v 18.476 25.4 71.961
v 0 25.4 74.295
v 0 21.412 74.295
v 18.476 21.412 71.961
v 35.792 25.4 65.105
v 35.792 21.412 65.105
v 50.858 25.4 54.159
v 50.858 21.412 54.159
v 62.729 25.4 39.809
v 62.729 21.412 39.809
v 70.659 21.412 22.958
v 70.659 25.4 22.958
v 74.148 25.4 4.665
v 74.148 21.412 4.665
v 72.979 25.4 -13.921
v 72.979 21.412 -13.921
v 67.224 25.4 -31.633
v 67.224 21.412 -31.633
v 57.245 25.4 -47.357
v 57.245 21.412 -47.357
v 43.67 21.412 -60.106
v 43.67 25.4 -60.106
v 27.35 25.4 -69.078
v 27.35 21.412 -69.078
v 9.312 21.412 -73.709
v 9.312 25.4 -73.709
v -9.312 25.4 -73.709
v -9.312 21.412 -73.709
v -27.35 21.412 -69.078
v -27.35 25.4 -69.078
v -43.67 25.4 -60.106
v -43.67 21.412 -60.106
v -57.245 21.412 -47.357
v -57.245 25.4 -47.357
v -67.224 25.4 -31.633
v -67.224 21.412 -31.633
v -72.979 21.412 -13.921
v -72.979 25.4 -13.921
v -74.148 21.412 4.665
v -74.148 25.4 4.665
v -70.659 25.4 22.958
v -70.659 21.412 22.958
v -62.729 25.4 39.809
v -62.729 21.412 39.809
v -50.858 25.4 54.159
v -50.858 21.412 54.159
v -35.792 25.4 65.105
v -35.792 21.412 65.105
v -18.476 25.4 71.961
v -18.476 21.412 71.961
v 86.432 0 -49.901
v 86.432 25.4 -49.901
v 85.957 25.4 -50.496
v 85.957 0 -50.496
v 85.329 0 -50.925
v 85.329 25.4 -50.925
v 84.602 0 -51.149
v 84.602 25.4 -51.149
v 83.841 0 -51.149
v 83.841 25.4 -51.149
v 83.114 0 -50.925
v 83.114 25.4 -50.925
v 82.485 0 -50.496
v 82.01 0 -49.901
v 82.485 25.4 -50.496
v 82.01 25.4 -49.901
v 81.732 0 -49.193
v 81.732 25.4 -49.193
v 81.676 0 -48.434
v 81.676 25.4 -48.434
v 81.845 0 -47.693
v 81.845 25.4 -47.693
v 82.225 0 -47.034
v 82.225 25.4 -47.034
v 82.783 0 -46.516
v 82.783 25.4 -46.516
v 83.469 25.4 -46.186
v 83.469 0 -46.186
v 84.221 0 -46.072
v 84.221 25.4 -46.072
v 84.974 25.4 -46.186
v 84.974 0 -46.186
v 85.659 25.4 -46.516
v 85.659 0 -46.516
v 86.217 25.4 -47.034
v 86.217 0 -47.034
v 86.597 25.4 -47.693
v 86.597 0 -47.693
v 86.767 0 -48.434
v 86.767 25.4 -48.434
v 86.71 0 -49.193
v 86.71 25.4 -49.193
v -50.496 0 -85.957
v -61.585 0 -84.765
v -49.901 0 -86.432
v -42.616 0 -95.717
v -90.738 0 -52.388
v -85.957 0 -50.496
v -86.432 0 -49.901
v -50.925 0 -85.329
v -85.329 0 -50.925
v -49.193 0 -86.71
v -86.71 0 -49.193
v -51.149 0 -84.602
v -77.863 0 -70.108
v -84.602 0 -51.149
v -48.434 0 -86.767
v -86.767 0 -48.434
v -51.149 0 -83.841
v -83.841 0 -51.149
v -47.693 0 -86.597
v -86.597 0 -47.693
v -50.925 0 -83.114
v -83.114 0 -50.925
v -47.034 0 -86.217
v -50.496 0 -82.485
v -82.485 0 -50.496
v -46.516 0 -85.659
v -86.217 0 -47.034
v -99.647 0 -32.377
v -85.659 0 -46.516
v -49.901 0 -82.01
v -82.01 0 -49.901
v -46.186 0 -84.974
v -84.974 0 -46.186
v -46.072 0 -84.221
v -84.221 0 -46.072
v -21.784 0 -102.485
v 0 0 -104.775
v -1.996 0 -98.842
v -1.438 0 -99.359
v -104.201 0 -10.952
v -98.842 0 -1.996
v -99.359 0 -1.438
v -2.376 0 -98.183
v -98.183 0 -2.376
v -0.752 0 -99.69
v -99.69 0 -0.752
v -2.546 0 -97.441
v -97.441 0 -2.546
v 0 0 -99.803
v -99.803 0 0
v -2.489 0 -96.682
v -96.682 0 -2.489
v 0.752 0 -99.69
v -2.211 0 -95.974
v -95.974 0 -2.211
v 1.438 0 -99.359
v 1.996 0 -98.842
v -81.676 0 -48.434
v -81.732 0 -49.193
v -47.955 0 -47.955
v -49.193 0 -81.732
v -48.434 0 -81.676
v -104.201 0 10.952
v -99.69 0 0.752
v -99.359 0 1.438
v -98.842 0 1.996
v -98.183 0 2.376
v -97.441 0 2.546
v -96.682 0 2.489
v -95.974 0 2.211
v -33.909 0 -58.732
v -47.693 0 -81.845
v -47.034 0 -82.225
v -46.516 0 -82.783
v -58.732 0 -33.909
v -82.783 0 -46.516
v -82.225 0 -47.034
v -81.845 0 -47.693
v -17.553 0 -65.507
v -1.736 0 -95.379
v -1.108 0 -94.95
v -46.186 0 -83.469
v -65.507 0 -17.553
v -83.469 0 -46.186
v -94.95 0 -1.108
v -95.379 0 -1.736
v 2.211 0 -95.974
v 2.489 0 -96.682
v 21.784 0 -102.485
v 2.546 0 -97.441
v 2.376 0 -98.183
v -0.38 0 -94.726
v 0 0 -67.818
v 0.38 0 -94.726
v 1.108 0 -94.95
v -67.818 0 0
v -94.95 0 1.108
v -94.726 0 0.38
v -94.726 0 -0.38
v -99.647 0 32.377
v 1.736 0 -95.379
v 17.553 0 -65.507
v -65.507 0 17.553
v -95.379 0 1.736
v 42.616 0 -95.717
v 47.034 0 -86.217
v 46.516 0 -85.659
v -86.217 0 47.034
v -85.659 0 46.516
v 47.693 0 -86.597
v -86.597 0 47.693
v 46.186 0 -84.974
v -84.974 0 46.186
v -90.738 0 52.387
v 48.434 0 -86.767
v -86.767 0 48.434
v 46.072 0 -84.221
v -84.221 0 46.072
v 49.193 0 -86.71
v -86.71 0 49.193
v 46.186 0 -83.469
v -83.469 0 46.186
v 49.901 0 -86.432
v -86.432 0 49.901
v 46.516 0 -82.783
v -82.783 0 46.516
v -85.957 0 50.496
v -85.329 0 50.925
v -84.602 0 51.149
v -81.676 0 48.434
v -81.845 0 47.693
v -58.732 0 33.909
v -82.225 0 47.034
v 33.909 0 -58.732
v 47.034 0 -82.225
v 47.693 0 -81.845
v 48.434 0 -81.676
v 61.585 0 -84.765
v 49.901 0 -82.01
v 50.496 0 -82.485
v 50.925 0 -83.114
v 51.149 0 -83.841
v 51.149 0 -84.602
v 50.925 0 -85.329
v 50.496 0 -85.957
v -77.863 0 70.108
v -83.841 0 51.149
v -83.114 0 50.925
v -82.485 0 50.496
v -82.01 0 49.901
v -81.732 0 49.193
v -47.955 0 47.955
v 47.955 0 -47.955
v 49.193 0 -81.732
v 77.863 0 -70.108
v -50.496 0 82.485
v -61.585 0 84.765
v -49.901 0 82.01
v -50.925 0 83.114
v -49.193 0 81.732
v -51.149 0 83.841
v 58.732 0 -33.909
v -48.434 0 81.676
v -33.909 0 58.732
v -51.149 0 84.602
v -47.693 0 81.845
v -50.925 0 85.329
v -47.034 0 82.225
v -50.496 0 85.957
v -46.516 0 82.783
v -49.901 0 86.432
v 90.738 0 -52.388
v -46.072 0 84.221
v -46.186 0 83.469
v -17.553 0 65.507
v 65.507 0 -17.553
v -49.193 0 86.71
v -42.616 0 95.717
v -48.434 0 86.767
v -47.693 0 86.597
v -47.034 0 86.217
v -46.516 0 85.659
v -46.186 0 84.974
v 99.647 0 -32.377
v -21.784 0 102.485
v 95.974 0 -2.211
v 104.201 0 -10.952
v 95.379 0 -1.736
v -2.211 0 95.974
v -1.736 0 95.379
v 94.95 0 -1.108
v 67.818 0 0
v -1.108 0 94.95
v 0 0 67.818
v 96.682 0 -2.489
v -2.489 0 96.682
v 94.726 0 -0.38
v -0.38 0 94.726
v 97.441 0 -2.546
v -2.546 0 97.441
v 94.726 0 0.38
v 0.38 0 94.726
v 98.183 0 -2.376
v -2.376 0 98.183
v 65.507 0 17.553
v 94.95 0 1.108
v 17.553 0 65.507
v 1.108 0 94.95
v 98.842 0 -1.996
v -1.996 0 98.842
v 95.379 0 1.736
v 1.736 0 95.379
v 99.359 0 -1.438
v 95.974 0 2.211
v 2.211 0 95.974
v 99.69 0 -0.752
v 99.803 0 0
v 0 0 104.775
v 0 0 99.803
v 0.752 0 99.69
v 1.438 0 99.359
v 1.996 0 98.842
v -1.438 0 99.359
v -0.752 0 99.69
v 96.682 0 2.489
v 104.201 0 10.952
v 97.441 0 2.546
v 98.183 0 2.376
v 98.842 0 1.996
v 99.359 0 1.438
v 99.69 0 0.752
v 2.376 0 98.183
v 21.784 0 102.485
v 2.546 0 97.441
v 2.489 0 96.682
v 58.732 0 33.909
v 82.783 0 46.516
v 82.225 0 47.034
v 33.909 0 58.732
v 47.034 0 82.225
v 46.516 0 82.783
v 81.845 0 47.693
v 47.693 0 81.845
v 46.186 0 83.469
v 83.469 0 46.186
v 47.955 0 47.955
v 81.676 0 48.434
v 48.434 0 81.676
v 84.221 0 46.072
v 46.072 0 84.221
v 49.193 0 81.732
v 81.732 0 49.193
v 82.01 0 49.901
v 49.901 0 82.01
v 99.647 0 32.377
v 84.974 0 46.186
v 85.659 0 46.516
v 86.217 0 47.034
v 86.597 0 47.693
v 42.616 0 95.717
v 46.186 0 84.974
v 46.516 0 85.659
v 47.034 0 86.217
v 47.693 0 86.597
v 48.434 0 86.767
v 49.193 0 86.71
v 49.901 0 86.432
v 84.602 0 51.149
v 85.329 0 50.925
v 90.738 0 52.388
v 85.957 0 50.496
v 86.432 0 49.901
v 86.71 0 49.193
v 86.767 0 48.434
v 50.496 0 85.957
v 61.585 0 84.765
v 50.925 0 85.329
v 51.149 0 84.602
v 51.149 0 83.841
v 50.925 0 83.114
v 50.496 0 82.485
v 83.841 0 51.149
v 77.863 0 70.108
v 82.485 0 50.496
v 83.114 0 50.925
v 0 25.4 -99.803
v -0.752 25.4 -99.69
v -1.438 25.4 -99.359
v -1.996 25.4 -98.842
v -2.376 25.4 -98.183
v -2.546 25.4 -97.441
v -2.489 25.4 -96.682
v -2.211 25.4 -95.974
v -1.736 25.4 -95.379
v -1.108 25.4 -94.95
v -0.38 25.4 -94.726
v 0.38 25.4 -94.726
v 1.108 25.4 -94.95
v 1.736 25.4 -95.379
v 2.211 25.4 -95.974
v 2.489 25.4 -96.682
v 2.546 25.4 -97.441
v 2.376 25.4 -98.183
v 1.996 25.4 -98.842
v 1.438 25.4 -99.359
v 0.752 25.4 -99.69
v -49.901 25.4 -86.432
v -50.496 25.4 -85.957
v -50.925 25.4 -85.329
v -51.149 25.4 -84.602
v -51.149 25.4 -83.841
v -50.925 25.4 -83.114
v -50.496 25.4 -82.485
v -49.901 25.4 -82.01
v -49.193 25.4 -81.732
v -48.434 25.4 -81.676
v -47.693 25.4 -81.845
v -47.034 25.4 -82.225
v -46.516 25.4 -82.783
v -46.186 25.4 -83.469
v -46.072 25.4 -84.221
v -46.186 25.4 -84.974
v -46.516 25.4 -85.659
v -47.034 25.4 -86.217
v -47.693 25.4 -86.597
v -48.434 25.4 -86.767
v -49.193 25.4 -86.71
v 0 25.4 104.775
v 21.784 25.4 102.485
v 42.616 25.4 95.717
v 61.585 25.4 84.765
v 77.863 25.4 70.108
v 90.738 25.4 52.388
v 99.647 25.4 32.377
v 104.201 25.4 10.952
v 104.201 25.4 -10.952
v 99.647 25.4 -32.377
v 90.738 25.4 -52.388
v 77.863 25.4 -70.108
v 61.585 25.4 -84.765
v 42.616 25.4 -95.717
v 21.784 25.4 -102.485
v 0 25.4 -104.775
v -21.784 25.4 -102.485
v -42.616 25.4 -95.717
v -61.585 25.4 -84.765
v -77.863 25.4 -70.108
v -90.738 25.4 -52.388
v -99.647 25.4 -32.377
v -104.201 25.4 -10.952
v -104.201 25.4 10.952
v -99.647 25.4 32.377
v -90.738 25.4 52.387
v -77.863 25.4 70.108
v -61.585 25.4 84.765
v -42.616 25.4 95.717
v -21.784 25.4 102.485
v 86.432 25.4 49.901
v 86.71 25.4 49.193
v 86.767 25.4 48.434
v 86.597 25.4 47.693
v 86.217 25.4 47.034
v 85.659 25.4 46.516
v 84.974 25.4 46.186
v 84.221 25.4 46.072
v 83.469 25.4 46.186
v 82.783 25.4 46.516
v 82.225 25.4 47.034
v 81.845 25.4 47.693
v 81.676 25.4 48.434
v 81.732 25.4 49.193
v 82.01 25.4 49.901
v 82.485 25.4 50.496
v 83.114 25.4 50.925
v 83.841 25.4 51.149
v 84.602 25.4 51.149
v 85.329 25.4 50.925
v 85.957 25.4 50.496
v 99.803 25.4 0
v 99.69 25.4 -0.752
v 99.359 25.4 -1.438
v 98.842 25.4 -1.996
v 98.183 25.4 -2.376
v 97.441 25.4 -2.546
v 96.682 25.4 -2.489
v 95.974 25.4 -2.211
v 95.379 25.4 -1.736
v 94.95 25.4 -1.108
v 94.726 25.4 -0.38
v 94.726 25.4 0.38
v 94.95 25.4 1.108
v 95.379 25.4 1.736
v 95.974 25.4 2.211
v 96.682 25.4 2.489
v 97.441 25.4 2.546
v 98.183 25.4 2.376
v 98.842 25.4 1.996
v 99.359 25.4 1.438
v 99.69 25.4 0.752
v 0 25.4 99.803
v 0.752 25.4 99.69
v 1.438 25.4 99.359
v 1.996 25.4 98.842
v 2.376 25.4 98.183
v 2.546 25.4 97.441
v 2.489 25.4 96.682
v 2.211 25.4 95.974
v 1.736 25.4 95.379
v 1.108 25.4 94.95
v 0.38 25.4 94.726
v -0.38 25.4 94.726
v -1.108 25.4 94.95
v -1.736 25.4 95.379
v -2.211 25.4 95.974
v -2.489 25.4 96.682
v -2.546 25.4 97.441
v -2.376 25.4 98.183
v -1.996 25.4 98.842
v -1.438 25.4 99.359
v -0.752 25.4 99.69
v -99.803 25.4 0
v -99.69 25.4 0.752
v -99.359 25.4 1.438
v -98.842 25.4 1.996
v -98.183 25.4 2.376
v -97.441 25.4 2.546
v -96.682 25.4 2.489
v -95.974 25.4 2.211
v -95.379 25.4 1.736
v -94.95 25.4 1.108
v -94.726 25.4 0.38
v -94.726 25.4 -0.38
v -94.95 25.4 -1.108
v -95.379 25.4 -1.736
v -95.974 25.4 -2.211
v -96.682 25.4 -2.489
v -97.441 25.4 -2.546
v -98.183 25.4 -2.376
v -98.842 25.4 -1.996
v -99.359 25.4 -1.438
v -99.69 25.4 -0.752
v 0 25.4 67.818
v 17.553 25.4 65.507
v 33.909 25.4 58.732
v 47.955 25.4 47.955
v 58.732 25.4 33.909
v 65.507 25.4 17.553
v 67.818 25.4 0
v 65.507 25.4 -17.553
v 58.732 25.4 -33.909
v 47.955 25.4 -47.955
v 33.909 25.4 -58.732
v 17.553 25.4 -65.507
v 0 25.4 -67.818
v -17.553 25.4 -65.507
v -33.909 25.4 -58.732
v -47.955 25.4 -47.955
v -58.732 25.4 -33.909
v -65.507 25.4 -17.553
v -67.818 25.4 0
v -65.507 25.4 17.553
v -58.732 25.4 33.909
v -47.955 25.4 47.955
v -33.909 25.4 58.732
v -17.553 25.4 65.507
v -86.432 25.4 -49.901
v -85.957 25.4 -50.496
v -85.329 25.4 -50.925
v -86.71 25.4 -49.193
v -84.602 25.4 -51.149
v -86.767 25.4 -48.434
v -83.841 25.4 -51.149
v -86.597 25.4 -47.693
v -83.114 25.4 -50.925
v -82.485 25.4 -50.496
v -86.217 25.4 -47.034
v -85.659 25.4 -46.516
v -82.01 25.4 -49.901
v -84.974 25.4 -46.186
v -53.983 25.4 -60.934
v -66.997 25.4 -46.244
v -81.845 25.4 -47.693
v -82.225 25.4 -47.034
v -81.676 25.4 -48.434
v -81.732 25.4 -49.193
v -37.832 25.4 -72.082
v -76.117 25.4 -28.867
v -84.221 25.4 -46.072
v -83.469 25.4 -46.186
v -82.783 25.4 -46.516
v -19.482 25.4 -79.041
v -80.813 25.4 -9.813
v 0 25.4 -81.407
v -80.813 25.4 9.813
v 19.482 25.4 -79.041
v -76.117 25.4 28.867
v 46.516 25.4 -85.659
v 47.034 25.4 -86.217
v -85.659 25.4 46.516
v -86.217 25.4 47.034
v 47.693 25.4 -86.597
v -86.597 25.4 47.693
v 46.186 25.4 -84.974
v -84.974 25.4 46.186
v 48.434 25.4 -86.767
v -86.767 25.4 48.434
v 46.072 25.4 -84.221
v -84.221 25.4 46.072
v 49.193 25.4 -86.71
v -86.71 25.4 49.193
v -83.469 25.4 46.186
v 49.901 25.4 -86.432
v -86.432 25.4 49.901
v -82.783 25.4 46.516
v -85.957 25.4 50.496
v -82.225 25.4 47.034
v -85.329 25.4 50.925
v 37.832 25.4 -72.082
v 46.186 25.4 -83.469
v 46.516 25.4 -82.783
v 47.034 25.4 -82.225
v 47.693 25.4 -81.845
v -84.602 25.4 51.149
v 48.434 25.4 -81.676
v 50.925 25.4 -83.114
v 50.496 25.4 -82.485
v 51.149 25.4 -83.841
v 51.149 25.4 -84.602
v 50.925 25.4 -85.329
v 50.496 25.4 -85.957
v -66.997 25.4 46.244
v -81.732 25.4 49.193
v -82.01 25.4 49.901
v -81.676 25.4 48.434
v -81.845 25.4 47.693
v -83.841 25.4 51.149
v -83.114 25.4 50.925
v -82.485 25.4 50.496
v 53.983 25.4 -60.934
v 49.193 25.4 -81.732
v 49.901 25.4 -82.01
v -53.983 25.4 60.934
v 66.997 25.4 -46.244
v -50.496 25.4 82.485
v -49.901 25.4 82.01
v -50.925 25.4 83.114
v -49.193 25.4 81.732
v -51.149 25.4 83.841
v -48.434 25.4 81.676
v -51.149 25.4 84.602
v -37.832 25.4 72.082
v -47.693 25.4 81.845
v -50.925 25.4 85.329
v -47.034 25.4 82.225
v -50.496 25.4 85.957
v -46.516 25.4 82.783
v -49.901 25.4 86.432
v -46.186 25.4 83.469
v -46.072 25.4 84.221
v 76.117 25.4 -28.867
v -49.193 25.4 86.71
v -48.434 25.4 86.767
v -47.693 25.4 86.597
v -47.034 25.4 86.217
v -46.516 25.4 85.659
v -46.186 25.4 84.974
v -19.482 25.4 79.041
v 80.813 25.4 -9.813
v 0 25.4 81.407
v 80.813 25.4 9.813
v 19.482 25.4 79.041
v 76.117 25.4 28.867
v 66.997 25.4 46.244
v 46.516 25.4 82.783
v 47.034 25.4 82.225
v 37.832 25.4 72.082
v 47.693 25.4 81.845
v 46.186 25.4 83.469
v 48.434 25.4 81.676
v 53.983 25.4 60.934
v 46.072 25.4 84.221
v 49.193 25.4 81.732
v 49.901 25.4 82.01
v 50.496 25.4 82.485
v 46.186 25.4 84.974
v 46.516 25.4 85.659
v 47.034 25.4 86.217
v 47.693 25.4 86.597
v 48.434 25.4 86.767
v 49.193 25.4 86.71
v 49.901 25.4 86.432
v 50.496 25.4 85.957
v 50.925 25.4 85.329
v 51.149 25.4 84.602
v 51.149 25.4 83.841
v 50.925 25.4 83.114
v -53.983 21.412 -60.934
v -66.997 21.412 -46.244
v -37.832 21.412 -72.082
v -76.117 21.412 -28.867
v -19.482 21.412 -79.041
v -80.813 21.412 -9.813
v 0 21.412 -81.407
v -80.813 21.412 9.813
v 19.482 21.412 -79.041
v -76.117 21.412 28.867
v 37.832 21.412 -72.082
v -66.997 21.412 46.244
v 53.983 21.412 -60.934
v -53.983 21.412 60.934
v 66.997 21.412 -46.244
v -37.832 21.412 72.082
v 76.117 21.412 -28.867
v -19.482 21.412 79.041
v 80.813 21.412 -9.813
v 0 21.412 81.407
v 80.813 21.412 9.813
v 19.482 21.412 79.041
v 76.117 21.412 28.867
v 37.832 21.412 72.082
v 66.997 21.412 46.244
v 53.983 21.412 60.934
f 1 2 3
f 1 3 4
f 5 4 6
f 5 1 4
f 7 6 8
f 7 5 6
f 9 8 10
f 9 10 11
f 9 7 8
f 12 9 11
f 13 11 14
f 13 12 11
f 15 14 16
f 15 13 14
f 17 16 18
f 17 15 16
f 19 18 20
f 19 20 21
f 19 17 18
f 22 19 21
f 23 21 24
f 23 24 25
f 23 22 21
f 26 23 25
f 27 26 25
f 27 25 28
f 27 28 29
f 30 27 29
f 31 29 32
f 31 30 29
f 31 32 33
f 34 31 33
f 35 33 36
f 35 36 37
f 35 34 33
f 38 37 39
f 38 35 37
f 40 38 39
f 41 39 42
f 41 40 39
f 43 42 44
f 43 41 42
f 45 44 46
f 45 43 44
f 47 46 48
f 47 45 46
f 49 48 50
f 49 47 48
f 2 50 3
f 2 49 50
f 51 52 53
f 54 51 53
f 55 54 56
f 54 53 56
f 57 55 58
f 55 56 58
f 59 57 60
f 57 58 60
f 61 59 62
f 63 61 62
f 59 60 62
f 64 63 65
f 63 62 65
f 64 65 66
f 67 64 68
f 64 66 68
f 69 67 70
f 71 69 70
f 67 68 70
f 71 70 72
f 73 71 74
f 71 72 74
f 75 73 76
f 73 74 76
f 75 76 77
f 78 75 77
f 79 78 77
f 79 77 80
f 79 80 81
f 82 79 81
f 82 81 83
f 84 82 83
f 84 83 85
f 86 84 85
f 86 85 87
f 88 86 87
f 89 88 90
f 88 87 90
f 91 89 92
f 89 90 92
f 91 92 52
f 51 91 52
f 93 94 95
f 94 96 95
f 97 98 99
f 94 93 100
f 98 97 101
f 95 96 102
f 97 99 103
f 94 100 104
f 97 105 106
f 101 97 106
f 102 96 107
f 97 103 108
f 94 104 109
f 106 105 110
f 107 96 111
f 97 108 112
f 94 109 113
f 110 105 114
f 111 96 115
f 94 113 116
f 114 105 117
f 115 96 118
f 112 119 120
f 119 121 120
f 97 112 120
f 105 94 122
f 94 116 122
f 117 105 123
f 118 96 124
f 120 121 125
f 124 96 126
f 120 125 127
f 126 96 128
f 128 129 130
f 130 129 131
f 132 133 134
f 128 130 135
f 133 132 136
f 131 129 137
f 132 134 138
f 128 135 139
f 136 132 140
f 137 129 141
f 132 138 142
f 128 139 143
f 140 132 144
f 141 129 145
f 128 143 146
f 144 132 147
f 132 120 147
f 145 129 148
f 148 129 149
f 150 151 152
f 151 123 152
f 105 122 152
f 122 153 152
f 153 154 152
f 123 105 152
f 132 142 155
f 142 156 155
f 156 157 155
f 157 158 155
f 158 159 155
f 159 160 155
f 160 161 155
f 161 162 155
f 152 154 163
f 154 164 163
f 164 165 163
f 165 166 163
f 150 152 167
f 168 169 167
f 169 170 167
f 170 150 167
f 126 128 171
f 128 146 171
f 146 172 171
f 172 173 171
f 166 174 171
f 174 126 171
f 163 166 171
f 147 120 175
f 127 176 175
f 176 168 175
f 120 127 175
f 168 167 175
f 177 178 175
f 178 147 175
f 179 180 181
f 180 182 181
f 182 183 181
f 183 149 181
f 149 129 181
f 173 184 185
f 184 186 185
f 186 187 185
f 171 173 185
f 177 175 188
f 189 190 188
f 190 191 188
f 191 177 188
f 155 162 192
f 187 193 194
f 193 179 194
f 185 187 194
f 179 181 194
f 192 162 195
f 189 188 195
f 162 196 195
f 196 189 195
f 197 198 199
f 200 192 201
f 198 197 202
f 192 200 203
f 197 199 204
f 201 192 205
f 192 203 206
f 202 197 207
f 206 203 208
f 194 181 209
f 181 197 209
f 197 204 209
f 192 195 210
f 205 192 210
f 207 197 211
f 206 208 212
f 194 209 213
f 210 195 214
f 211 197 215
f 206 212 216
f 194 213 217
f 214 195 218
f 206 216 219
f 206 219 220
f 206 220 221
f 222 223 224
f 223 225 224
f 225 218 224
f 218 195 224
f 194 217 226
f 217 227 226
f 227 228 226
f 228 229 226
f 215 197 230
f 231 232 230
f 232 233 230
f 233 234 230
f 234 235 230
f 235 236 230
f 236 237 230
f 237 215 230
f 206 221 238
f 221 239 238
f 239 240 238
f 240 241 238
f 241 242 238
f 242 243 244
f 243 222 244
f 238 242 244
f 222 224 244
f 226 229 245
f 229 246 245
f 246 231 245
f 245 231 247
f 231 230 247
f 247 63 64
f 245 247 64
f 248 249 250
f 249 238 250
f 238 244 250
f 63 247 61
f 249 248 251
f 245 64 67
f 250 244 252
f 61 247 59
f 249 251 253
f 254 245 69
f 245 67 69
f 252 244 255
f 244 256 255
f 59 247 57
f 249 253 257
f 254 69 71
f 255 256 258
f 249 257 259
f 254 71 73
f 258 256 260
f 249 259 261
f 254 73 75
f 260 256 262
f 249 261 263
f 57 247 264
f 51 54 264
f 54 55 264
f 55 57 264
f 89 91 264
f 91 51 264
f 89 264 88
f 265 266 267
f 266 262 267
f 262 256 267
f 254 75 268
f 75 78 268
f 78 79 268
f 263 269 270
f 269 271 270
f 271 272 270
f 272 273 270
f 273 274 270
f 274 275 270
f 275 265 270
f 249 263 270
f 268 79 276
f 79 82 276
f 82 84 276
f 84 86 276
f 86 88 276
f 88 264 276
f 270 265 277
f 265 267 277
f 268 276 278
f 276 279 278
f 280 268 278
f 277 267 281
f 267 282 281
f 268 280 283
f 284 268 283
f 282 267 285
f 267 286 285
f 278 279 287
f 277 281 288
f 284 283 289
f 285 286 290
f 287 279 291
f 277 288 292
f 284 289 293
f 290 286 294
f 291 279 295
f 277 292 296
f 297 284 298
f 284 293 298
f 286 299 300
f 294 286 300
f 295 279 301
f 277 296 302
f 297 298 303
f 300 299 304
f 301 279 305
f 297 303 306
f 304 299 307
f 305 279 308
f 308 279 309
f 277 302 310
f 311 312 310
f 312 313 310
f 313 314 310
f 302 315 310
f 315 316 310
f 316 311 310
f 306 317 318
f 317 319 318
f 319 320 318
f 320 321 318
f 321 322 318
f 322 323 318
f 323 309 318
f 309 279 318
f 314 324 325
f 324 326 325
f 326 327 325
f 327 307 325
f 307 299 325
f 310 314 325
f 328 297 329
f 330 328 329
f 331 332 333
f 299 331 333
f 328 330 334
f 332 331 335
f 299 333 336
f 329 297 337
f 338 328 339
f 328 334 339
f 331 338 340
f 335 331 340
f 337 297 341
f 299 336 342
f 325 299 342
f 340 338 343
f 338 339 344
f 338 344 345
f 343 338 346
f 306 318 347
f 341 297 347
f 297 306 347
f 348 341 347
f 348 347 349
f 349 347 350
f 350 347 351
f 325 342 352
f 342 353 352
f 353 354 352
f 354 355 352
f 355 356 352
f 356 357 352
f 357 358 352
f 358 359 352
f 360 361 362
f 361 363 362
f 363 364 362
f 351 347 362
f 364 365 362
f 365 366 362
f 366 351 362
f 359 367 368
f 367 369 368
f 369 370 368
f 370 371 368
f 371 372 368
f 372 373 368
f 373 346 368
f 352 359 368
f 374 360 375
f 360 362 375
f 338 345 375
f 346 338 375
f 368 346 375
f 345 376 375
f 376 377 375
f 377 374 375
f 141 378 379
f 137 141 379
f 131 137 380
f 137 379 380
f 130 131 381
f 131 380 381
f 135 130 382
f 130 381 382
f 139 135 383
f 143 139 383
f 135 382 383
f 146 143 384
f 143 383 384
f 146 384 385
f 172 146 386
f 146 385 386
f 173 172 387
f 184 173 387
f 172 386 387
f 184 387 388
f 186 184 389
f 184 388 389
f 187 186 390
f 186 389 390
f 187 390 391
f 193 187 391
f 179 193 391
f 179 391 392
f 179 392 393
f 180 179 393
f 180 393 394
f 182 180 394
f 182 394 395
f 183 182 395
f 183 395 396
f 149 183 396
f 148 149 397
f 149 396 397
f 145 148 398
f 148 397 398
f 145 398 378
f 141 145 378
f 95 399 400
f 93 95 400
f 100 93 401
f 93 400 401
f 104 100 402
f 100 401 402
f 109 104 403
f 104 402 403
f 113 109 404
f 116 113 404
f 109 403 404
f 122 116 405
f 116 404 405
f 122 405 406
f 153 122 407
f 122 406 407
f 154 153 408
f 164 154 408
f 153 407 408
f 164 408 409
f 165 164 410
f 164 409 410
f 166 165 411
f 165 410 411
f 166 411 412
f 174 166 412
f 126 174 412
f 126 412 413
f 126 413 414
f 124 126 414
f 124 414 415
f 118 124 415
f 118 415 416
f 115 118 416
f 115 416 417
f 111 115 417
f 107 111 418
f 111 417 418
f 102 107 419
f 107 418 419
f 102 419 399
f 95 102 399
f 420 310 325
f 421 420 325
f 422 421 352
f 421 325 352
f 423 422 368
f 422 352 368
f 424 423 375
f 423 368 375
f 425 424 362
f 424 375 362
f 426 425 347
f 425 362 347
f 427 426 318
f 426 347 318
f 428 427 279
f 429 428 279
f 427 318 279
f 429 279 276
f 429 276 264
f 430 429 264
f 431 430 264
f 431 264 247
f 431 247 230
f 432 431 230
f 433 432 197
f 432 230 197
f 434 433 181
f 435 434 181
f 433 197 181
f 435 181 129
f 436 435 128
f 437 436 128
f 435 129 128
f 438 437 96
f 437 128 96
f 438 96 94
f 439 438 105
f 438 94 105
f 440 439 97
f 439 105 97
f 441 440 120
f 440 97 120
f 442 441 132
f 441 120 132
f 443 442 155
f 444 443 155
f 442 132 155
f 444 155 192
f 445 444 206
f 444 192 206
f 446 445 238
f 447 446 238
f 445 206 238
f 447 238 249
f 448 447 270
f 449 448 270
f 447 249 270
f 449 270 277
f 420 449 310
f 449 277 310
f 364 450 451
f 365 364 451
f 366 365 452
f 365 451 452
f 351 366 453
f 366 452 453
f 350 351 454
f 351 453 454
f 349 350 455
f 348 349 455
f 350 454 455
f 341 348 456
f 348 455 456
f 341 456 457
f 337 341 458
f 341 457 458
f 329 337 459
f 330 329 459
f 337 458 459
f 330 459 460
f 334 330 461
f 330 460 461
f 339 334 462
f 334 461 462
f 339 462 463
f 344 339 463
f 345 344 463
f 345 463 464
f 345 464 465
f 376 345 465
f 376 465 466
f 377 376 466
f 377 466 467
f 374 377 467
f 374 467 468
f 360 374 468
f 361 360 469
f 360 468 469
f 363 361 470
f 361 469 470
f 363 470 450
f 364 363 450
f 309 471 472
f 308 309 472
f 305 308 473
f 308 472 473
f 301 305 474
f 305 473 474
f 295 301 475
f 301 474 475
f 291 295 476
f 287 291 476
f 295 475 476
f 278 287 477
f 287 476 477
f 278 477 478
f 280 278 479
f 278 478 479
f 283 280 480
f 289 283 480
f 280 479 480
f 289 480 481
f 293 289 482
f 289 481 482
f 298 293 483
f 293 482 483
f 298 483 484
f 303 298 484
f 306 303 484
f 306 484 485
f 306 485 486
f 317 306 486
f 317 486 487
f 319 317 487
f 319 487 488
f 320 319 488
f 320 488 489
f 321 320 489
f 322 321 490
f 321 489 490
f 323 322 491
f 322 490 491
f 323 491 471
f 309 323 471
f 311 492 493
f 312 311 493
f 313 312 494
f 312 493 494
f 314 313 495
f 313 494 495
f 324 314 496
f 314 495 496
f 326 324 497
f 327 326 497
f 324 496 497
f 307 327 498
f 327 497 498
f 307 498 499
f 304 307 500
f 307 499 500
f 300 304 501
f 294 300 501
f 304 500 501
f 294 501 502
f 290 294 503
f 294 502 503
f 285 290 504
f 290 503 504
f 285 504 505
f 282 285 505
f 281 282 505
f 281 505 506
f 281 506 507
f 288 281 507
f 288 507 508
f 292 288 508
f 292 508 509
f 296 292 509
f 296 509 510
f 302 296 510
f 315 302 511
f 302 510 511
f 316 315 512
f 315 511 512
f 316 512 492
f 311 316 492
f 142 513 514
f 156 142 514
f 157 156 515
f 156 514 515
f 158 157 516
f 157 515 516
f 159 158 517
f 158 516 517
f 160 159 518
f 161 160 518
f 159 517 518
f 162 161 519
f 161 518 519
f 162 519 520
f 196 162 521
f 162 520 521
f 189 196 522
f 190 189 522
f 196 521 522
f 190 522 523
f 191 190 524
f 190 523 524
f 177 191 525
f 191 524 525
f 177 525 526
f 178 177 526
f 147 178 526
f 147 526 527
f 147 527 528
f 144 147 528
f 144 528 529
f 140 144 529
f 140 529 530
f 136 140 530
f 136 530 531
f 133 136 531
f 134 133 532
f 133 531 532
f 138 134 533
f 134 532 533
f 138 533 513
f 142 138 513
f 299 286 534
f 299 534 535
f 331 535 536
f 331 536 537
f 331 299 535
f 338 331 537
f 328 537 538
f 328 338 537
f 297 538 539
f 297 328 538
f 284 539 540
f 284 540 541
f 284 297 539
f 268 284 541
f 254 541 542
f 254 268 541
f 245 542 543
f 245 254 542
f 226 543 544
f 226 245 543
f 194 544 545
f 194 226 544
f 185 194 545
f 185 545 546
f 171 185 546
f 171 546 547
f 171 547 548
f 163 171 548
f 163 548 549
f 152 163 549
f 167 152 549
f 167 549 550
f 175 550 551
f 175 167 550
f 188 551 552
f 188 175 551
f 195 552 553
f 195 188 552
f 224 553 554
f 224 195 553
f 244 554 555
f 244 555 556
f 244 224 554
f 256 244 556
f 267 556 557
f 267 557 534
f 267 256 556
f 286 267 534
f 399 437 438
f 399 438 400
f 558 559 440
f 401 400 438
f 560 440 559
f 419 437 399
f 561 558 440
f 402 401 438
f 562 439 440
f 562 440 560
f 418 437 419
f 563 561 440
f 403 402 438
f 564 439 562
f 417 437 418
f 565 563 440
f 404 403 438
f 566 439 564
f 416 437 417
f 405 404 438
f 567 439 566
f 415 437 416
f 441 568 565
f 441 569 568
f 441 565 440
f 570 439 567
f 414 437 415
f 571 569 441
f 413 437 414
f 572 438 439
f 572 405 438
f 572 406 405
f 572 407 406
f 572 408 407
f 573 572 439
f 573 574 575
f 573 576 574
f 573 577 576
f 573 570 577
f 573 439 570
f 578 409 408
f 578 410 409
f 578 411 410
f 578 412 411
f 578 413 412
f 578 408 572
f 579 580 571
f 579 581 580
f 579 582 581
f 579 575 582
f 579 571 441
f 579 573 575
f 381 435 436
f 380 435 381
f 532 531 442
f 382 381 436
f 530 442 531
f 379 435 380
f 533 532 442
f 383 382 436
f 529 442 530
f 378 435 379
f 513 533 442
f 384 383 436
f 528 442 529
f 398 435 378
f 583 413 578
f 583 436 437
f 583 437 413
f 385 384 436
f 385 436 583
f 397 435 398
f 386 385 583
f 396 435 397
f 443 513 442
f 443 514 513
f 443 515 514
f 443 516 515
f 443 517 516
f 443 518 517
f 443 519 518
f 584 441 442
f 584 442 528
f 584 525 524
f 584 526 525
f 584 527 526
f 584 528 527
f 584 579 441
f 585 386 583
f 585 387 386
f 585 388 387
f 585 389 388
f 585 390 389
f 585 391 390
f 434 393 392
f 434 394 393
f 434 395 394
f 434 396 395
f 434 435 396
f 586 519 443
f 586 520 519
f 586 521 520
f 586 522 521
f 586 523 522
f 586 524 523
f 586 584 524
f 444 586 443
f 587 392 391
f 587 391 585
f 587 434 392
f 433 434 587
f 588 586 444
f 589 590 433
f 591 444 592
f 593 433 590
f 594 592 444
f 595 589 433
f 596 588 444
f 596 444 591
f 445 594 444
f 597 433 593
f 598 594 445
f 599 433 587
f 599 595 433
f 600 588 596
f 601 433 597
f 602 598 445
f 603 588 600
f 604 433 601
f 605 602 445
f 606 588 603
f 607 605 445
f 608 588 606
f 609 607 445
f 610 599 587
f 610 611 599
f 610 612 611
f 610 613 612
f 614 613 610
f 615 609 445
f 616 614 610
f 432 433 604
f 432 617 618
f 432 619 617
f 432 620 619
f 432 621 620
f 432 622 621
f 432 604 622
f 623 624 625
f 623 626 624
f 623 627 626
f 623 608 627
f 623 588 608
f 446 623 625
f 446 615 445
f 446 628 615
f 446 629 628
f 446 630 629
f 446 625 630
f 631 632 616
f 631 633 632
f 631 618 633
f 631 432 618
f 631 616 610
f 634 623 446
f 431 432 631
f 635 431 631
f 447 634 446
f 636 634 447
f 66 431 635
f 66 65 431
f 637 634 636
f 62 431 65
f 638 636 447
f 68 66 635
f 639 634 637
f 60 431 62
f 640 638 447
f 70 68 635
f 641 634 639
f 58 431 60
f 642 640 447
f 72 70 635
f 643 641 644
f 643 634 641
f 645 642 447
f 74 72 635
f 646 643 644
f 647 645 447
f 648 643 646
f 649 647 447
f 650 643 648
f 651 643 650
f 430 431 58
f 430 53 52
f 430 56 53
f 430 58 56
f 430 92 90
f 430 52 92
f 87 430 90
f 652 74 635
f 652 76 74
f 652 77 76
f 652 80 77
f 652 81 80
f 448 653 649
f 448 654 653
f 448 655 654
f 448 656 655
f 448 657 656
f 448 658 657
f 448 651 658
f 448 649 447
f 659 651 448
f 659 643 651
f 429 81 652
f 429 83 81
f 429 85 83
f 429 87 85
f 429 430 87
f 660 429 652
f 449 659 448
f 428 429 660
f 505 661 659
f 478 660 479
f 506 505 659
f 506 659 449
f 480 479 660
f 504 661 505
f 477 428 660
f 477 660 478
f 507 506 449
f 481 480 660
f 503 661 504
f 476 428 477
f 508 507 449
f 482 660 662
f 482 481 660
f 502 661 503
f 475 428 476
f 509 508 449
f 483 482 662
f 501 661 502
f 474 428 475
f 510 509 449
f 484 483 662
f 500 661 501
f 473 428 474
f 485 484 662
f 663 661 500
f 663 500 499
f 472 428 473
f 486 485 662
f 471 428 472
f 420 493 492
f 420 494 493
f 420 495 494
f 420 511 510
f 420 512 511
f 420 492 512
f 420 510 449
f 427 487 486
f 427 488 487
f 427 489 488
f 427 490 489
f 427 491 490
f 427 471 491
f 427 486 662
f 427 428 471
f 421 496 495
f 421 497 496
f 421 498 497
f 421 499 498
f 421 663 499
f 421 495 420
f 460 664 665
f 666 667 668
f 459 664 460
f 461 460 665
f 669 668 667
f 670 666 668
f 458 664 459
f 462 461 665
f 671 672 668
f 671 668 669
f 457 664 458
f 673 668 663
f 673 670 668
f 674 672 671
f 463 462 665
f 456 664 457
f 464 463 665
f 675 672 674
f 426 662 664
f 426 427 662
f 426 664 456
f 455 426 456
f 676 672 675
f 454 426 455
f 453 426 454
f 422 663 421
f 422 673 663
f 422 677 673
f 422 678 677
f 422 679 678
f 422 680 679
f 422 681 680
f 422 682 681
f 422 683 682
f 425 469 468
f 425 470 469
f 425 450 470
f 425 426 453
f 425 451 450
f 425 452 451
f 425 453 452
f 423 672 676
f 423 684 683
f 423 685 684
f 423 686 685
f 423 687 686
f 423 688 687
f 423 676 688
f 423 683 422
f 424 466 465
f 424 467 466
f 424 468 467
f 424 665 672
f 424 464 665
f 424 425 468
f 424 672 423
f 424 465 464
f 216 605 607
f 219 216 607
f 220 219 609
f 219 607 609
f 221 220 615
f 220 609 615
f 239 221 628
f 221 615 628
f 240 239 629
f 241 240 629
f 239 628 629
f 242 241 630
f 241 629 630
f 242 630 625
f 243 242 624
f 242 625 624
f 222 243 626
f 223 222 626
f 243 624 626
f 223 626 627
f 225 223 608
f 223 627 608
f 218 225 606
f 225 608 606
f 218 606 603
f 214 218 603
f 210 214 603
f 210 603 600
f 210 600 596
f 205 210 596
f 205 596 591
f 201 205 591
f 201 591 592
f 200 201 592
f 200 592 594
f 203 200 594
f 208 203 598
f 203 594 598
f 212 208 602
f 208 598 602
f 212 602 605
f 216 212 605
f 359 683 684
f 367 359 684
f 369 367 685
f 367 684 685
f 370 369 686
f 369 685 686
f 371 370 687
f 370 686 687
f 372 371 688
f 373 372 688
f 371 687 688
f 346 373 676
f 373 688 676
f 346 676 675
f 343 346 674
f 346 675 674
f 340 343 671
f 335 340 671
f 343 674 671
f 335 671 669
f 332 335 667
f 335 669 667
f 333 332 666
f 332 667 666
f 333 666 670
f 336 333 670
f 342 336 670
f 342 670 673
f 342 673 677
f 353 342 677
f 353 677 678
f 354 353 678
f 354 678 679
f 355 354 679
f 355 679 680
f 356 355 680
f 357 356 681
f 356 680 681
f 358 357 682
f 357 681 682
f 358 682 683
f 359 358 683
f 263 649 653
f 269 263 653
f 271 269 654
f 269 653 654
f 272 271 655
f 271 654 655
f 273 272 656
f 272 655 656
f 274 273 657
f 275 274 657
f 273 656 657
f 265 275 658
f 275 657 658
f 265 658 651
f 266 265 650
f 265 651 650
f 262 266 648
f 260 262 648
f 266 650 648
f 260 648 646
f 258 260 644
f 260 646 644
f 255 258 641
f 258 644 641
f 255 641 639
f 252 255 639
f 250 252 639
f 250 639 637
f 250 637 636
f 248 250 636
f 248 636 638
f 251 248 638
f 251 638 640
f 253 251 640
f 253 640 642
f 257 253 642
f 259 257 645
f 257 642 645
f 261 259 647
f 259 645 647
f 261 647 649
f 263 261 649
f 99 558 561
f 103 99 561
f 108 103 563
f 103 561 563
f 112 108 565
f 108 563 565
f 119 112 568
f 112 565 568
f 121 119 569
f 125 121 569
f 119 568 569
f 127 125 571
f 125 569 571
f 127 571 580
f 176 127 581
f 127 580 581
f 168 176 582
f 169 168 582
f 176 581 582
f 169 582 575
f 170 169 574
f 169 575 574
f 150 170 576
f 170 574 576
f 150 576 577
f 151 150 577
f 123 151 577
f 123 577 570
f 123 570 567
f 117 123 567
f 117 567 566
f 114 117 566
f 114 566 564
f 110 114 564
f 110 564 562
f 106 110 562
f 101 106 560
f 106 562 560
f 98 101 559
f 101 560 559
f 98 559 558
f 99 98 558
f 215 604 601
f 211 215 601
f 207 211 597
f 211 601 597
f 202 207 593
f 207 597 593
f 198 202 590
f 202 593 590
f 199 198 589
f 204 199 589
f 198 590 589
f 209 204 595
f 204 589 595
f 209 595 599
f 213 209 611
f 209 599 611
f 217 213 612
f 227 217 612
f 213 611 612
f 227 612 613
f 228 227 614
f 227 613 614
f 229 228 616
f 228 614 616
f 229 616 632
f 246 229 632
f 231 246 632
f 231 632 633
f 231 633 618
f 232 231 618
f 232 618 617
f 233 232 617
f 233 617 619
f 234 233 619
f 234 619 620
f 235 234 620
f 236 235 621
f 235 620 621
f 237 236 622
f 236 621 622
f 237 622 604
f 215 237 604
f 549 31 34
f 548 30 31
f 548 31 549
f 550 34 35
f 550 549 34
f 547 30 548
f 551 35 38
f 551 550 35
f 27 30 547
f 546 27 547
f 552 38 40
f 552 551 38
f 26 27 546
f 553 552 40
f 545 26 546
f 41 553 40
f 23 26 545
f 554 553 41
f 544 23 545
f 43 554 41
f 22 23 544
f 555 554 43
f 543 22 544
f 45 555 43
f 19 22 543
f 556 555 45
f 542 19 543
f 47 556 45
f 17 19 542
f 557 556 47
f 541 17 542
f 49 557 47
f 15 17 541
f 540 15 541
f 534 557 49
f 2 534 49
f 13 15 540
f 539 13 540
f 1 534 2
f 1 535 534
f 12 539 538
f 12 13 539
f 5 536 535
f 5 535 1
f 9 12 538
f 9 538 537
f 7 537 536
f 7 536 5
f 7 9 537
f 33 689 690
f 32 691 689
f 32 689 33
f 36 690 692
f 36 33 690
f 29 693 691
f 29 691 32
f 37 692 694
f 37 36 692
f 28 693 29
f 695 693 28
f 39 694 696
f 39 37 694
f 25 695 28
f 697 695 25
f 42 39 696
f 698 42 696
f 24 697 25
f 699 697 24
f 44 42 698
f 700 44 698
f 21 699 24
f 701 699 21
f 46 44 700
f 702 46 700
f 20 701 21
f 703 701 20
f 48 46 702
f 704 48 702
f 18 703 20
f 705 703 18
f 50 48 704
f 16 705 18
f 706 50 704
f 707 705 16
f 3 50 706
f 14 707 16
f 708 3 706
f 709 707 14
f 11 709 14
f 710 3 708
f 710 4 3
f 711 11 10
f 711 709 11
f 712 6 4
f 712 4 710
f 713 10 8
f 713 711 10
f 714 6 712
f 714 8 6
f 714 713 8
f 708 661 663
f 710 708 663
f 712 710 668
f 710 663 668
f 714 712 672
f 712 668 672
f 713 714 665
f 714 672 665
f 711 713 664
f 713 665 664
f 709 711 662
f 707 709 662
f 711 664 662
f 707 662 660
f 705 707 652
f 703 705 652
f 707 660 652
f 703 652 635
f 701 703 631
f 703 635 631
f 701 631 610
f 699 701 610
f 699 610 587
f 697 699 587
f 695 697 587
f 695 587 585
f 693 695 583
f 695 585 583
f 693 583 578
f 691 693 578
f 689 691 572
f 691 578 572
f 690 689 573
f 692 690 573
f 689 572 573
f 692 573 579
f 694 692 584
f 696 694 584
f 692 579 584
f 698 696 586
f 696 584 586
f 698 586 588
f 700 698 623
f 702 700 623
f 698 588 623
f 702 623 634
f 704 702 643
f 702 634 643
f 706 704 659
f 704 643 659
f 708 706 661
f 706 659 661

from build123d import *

# Parameters (mm, degrees)
SKETCH2_R         = 104.775
SKETCH2_R_2       = 67.818
FLANGE_DEPTH      = 25.4
SKETCH4_R         = 81.407
SKETCH4_R_2       = 74.295
GROOVE_DEPTH      = 3.9878
SKETCH5_R         = 2.5527
SCREW_HOLES_DEPTH = 25.4
CIRPATTERN1_COUNT = 12


with BuildPart() as part:
    # Sketch2 → Flange (new body)
    with BuildSketch(Plane(origin=(0, 0, 0), x_dir=(1, 0, 0), z_dir=(0, 1, 0))):
        with Locations(Location((0, 0, 0), (0, 0, 270))):
            Circle(SKETCH2_R)
        with Locations(Location((0, 0, 0), (0, 0, 270))):
            Circle(SKETCH2_R_2, mode=Mode.SUBTRACT)
    extrude(amount=FLANGE_DEPTH)

    # Sketch4 → Groove (cut)
    with BuildSketch(Plane(origin=(0, 25.4, 0), x_dir=(1, 0, 0), z_dir=(0, 1, 0))):
        with Locations(Location((0, 0, 0), (0, 0, 270))):
            Circle(SKETCH4_R)
        with Locations(Location((0, 0, 0), (0, 0, 270))):
            Circle(SKETCH4_R_2, mode=Mode.SUBTRACT)
    extrude(amount=-GROOVE_DEPTH, mode=Mode.SUBTRACT)

    # Sketch5 → Screw Holes (cut)
    with BuildSketch(Plane(origin=(0, 25.4, 0), x_dir=(1, 0, 0), z_dir=(0, 1, 0))):
        with Locations(Location((0, -97.25025, 0), (0, 0, 270))):
            Circle(SKETCH5_R)
    screw_holes = extrude(amount=-SCREW_HOLES_DEPTH, mode=Mode.SUBTRACT)

    # CirPattern1: Screw Holes ×12 about axis
    cirpattern1_axis = Axis((0, 0, 0), (0, 1, 0))
    for i in range(1, CIRPATTERN1_COUNT):
        add(screw_holes.rotate(cirpattern1_axis, i * 360 / CIRPATTERN1_COUNT), mode=Mode.SUBTRACT)


solid = part.part
